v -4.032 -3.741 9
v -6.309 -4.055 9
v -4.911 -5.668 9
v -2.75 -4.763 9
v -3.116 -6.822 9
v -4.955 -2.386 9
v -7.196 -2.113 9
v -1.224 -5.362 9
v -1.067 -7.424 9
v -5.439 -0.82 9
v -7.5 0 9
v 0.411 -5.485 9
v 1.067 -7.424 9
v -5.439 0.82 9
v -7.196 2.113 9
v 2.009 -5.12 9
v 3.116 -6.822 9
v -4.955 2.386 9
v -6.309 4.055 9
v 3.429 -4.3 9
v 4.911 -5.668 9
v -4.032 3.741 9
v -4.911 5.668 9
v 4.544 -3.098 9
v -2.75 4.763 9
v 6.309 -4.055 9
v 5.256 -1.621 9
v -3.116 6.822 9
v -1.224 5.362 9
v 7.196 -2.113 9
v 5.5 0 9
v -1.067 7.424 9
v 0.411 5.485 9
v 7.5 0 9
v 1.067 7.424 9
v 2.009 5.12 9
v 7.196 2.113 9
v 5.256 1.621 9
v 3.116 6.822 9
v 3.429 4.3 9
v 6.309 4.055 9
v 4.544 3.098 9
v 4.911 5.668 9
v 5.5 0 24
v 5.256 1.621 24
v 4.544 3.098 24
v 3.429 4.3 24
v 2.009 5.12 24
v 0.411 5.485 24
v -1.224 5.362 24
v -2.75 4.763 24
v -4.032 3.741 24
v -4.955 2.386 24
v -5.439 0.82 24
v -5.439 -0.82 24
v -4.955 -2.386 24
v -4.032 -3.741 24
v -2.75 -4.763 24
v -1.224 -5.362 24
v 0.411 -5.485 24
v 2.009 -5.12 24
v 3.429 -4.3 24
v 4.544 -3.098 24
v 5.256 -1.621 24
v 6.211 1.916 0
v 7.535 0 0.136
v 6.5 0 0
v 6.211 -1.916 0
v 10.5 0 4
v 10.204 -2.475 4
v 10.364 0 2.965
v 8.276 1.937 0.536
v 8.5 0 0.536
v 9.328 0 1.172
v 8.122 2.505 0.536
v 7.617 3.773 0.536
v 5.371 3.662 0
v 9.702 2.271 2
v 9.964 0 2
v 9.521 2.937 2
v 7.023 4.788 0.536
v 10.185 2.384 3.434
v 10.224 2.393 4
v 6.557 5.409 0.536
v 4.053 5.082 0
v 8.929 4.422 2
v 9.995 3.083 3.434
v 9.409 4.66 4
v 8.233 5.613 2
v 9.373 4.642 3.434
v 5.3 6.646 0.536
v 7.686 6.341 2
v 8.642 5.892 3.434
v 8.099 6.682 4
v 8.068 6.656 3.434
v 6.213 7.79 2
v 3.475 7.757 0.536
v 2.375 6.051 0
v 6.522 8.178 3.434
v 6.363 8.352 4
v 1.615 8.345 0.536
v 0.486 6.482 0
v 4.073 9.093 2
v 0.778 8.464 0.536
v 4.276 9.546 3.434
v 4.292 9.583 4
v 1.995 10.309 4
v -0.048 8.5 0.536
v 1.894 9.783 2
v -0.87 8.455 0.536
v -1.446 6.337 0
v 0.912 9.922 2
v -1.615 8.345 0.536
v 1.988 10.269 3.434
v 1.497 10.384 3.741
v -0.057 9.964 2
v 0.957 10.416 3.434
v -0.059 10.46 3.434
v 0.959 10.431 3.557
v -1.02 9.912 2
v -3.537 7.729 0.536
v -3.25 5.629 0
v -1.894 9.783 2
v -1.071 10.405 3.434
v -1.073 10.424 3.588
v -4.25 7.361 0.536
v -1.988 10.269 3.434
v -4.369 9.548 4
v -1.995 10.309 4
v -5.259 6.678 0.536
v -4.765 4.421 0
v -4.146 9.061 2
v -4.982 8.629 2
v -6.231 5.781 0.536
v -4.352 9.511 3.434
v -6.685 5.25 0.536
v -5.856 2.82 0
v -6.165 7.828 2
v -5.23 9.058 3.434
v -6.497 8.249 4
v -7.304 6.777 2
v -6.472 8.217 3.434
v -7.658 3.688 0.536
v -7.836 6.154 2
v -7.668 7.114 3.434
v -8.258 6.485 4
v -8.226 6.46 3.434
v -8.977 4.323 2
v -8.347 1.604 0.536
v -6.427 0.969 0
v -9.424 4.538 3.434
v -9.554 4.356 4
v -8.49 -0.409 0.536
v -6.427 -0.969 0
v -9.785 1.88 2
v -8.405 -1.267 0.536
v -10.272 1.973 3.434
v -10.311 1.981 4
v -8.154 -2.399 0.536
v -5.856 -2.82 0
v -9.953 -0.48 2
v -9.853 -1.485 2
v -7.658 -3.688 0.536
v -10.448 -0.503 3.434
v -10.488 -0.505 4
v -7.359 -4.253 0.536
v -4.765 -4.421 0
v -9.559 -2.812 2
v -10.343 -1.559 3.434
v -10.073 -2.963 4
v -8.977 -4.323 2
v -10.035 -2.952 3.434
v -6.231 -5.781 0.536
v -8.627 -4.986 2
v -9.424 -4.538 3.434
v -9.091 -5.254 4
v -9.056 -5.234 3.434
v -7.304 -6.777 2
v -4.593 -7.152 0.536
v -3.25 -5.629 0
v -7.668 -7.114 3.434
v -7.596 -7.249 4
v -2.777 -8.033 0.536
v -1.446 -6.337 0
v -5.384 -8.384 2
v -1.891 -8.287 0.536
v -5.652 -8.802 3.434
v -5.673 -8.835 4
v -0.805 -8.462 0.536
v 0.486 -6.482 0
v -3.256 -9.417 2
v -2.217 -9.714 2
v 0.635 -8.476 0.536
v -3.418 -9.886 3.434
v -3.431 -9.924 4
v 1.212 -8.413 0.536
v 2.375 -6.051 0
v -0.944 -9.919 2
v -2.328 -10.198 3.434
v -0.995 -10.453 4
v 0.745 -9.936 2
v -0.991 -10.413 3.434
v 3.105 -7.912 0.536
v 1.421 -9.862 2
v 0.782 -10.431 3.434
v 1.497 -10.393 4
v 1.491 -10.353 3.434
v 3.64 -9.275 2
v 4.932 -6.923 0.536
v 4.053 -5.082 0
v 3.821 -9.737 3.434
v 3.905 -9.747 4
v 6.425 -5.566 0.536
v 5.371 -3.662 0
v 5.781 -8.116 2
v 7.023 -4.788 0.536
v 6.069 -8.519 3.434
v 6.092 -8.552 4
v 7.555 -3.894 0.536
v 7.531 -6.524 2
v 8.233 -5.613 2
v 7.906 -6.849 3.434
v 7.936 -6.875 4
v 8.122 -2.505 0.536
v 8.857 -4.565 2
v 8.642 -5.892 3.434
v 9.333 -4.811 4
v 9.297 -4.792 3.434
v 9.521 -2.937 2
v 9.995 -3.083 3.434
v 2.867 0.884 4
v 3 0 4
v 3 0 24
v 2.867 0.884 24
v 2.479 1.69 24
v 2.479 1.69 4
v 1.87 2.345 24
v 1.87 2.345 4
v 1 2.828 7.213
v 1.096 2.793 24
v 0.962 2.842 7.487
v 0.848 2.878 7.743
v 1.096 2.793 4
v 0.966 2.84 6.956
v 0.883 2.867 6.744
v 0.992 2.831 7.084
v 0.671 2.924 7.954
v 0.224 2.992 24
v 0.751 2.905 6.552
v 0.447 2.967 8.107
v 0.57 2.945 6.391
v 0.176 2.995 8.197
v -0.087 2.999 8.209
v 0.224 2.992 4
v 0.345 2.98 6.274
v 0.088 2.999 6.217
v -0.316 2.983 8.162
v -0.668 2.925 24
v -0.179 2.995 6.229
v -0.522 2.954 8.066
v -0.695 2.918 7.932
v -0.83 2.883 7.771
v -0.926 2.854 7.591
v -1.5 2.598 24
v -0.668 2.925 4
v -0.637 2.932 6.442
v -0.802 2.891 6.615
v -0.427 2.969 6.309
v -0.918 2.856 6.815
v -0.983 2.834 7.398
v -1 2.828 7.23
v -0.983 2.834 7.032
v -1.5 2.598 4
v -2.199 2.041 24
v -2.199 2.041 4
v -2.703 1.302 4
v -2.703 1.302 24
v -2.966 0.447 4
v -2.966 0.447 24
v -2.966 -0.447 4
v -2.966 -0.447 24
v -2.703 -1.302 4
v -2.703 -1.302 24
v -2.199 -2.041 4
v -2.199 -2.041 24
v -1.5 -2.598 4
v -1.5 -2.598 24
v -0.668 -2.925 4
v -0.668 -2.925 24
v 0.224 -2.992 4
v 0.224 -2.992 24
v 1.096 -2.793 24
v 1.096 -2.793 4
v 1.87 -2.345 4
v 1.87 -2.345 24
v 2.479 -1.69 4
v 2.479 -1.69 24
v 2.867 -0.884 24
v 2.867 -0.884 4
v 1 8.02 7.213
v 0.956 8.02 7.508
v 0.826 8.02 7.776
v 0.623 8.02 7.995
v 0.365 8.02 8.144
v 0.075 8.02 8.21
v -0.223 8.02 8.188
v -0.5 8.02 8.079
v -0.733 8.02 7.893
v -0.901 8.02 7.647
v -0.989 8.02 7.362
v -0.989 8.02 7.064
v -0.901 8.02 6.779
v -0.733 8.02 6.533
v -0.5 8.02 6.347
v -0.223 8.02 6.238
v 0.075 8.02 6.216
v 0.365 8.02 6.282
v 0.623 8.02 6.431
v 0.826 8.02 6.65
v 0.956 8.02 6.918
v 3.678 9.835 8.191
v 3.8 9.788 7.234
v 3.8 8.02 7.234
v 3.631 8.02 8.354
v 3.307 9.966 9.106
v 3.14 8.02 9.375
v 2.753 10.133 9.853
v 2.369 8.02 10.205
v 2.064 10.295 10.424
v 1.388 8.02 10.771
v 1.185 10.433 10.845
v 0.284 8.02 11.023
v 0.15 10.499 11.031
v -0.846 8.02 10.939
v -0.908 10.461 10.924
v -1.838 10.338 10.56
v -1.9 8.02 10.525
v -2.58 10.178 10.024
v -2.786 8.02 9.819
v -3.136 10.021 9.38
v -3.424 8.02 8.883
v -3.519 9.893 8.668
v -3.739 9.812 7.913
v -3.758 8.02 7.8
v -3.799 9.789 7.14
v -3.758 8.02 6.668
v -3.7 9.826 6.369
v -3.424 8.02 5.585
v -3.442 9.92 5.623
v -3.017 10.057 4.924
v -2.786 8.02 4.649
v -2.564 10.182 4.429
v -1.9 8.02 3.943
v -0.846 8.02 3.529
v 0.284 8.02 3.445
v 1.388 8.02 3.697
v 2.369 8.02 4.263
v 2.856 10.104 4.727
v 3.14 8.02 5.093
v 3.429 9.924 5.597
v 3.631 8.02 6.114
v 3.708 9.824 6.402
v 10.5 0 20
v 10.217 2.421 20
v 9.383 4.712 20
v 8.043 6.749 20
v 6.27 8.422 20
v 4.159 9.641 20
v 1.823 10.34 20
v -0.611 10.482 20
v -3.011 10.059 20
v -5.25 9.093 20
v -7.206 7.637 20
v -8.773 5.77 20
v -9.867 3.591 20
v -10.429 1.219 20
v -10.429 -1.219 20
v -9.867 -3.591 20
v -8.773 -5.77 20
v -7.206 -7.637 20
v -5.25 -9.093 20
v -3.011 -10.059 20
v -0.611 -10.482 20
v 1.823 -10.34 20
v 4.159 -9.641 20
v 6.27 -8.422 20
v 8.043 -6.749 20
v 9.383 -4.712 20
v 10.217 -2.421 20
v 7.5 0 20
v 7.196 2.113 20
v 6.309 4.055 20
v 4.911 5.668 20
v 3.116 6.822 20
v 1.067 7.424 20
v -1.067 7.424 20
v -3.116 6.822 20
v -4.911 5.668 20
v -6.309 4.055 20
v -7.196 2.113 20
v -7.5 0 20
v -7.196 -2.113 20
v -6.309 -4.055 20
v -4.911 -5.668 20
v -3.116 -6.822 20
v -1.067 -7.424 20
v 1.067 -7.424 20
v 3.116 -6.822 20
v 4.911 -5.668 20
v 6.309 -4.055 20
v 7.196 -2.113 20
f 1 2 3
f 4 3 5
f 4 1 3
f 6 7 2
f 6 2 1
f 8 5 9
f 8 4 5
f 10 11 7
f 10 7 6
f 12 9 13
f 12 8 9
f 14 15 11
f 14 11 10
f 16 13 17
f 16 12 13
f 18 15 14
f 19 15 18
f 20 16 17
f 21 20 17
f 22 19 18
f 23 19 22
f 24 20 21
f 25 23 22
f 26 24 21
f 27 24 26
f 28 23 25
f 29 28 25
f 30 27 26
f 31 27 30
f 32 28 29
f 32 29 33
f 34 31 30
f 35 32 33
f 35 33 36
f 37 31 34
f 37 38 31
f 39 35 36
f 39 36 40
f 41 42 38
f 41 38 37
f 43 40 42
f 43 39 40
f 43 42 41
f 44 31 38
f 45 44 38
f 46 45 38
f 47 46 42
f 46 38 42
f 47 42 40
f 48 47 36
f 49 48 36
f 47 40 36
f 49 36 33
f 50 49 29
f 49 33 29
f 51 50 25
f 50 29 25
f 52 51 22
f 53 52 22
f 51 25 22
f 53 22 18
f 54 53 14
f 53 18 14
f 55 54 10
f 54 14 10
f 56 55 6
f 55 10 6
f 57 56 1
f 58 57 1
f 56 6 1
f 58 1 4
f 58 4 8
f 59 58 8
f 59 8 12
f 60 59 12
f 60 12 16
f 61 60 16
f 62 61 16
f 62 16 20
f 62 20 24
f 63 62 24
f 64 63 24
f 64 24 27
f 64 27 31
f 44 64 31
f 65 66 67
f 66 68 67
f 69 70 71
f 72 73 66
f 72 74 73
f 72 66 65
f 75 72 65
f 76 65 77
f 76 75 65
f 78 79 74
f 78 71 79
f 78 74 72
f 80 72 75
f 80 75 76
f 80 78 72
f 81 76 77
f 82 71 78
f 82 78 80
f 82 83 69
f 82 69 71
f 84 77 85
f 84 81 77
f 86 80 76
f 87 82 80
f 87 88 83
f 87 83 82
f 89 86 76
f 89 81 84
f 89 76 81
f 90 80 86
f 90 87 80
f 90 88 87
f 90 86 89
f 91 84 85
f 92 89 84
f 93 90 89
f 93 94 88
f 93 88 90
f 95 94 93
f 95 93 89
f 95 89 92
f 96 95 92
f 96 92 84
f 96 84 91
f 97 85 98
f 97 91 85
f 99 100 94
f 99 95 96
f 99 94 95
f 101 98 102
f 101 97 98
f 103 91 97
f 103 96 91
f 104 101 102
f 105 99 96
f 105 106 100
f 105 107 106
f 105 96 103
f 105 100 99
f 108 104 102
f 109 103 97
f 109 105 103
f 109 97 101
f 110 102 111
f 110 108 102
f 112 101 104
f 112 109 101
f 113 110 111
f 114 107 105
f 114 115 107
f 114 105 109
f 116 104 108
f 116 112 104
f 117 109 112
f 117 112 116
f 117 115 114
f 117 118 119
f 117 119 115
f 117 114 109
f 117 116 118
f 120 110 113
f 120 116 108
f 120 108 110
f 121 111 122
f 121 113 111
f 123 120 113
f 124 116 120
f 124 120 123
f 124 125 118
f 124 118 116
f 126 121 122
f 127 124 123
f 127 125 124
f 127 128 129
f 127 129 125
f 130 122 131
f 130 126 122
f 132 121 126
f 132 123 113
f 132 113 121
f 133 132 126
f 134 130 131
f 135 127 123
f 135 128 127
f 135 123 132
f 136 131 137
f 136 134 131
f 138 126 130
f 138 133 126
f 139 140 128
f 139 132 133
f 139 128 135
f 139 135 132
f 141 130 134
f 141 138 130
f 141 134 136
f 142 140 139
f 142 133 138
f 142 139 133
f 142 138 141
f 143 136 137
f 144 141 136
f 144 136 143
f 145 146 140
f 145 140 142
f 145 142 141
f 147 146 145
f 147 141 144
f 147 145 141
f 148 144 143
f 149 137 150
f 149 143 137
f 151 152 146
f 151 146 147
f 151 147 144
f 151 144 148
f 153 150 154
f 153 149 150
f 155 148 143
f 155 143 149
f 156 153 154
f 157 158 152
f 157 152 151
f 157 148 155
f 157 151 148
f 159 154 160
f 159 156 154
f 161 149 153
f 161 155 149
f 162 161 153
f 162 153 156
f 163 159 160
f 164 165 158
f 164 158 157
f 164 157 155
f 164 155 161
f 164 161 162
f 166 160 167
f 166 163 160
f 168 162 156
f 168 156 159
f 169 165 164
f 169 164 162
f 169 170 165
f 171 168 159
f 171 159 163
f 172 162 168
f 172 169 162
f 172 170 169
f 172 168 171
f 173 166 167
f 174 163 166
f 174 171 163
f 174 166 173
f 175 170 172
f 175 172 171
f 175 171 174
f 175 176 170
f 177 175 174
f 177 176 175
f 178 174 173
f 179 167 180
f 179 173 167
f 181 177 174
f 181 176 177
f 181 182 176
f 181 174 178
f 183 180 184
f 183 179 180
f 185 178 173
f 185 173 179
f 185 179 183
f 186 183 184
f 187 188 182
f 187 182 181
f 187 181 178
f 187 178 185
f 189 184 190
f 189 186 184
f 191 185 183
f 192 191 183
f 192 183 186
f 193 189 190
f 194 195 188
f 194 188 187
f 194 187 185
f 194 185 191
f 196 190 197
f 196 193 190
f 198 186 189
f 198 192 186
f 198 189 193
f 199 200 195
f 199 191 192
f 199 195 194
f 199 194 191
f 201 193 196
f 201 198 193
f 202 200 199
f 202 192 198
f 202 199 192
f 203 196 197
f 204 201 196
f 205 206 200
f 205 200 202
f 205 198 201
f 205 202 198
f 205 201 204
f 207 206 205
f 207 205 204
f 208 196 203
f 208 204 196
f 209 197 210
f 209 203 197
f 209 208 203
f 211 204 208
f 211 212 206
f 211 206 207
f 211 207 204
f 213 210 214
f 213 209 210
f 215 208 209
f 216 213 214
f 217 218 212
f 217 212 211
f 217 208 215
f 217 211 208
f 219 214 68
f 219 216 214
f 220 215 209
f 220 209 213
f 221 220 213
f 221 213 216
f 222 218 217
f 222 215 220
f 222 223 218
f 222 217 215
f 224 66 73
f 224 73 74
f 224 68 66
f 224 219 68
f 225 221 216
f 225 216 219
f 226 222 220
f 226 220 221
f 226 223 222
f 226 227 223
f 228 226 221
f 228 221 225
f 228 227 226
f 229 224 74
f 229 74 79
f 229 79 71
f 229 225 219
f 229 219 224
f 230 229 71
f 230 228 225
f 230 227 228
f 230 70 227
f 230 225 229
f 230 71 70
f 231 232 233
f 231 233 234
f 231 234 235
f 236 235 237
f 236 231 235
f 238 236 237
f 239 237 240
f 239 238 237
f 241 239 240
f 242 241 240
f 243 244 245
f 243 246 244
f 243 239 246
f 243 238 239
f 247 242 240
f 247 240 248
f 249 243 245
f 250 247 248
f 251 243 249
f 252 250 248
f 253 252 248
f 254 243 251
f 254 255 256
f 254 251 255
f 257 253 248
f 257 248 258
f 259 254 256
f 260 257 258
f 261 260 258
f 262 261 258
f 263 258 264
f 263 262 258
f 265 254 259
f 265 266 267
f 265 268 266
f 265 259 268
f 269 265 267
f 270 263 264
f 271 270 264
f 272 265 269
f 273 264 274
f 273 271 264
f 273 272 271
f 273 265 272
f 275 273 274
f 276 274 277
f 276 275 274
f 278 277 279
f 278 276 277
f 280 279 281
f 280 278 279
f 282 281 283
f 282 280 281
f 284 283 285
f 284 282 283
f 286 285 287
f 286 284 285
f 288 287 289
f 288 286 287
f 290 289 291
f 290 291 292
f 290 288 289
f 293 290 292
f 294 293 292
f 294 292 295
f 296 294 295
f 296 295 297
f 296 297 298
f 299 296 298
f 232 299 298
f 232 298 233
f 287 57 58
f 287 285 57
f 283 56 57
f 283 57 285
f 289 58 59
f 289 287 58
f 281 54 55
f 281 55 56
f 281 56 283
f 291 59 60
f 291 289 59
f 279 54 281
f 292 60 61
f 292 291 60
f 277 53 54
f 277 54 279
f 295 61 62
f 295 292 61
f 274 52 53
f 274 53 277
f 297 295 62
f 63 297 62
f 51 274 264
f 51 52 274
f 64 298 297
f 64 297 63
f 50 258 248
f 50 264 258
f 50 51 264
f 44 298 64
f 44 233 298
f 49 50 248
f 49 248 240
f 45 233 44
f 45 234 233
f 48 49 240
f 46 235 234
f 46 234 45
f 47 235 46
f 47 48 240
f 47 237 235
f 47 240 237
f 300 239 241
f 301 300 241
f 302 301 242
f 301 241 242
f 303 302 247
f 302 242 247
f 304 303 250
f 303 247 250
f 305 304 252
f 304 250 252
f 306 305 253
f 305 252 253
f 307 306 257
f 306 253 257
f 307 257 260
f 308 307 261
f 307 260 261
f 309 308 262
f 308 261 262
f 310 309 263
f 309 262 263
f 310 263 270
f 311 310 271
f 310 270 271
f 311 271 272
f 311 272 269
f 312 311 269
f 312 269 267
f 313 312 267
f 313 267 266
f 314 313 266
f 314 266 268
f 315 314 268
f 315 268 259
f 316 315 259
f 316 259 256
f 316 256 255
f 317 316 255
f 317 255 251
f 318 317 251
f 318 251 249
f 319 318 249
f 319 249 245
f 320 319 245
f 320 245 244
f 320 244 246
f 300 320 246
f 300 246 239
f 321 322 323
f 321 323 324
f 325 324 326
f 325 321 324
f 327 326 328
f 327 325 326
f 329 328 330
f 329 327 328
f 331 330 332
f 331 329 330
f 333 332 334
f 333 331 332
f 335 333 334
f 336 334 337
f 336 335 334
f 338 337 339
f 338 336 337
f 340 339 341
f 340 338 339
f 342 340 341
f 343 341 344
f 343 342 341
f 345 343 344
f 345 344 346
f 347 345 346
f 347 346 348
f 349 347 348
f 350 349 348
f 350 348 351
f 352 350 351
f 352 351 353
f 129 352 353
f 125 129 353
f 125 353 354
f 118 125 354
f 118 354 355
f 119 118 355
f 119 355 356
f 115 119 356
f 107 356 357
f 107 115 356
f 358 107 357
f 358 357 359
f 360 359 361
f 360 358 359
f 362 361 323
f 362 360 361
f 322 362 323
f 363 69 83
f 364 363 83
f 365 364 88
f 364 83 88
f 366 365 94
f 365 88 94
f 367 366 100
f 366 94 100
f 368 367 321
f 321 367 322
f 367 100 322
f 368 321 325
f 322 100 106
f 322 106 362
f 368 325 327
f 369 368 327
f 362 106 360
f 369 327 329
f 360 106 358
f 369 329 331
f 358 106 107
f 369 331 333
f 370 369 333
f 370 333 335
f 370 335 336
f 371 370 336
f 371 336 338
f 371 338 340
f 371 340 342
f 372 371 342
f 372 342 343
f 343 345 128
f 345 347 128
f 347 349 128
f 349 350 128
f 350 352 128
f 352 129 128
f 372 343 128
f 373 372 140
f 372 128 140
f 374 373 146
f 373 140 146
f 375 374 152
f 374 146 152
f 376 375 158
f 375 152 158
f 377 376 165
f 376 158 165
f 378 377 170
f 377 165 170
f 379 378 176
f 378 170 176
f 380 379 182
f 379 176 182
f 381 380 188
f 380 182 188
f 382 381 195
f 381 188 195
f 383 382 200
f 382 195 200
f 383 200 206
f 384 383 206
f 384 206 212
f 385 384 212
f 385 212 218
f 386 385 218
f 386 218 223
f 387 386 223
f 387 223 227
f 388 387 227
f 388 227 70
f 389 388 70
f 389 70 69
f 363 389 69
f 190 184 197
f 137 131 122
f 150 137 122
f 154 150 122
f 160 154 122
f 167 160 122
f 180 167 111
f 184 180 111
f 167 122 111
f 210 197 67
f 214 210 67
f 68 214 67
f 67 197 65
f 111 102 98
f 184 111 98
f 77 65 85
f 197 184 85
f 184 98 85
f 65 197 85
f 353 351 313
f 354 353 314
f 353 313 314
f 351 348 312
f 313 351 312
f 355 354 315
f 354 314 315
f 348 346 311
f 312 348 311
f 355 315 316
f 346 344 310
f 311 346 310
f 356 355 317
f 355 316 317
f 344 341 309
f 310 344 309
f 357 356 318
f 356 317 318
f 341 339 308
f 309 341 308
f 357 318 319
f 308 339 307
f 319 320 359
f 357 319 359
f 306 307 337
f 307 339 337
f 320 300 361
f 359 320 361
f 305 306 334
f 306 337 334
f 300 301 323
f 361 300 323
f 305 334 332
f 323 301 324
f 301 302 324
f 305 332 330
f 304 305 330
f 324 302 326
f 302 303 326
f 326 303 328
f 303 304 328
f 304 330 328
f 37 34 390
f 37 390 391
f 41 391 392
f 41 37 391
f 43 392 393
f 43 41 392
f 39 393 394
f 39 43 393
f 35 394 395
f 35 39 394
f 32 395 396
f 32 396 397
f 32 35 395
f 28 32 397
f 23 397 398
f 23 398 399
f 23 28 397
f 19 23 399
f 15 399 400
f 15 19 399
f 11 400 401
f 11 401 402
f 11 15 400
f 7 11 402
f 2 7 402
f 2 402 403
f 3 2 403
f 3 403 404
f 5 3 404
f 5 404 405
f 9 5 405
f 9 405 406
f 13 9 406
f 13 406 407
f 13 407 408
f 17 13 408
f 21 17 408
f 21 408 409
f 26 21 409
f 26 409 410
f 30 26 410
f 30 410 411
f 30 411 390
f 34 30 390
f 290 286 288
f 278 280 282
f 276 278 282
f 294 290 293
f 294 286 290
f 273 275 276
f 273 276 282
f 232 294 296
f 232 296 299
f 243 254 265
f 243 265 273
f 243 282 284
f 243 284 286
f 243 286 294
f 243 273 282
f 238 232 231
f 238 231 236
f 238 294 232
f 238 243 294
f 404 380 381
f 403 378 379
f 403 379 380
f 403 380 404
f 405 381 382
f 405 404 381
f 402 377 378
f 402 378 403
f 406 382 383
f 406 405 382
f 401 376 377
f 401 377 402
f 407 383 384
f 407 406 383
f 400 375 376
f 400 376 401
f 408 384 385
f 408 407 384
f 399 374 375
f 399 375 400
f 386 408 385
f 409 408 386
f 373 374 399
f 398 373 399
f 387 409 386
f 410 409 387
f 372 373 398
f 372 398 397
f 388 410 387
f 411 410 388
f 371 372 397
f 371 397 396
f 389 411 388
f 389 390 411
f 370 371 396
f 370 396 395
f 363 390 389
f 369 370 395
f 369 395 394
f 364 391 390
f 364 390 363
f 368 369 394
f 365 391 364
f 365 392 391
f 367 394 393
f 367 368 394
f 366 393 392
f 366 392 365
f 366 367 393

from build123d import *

# Parameters (mm, degrees)
F0_R      = 10.5
F0_R_2    = 7.5
F1_DEPTH  = 20
F2_DEPTH  = 4
F3_R      = 4
F4_R      = 5.5
F4_R_2    = 3
F5_DEPTH  = 20
F6_DEPTH  = 5
F7_R      = 1
F8_DEPTH  = 25
F10_R     = 3.8
F11_DEPTH = 2.5


with BuildPart() as f1:
    # F0 (on Top) → F1 (new body)
    with BuildSketch(Plane.XY):
        Circle(F0_R)
        Circle(F0_R_2, mode=Mode.SUBTRACT)
    extrude(amount=F1_DEPTH)

    # F0 (on Top) → F2 (join)
    with BuildSketch(Plane.XY):
        Circle(F0_R_2)
    extrude(amount=F2_DEPTH)

    # F3
    f3_edges = [f1.edges().sort_by_distance(p)[0] for p in [
        (-10.5, 0, 0),
    ]]
    fillet(f3_edges, radius=F3_R)

    # F4 (on face) → F5 (join)
    with BuildSketch(Plane.XY.offset(4)):
        Circle(F4_R)
        Circle(F4_R_2, mode=Mode.SUBTRACT)
    extrude(amount=F5_DEPTH)

    # F6 (add): a face of the model
    f6_faces = [f1.faces().sort_by_distance(p)[0] for p in [
        (-7.2878679656, 0, 4),
    ]]
    extrude(f6_faces, amount=F6_DEPTH)

    # F7 (on Front) → F8 (cut)
    with BuildSketch(Plane.XZ):
        with Locations((0, 7.2128833695)):
            Circle(F7_R)
    extrude(amount=-F8_DEPTH, mode=Mode.SUBTRACT)

    # F10 (on offset) → F11 (cut)
    with BuildSketch(Plane.XZ.offset(-10.52)):
        with Locations((0, 7.2339284234)):
            Circle(F10_R)
    extrude(amount=F11_DEPTH, mode=Mode.SUBTRACT)


solid = f1.part
